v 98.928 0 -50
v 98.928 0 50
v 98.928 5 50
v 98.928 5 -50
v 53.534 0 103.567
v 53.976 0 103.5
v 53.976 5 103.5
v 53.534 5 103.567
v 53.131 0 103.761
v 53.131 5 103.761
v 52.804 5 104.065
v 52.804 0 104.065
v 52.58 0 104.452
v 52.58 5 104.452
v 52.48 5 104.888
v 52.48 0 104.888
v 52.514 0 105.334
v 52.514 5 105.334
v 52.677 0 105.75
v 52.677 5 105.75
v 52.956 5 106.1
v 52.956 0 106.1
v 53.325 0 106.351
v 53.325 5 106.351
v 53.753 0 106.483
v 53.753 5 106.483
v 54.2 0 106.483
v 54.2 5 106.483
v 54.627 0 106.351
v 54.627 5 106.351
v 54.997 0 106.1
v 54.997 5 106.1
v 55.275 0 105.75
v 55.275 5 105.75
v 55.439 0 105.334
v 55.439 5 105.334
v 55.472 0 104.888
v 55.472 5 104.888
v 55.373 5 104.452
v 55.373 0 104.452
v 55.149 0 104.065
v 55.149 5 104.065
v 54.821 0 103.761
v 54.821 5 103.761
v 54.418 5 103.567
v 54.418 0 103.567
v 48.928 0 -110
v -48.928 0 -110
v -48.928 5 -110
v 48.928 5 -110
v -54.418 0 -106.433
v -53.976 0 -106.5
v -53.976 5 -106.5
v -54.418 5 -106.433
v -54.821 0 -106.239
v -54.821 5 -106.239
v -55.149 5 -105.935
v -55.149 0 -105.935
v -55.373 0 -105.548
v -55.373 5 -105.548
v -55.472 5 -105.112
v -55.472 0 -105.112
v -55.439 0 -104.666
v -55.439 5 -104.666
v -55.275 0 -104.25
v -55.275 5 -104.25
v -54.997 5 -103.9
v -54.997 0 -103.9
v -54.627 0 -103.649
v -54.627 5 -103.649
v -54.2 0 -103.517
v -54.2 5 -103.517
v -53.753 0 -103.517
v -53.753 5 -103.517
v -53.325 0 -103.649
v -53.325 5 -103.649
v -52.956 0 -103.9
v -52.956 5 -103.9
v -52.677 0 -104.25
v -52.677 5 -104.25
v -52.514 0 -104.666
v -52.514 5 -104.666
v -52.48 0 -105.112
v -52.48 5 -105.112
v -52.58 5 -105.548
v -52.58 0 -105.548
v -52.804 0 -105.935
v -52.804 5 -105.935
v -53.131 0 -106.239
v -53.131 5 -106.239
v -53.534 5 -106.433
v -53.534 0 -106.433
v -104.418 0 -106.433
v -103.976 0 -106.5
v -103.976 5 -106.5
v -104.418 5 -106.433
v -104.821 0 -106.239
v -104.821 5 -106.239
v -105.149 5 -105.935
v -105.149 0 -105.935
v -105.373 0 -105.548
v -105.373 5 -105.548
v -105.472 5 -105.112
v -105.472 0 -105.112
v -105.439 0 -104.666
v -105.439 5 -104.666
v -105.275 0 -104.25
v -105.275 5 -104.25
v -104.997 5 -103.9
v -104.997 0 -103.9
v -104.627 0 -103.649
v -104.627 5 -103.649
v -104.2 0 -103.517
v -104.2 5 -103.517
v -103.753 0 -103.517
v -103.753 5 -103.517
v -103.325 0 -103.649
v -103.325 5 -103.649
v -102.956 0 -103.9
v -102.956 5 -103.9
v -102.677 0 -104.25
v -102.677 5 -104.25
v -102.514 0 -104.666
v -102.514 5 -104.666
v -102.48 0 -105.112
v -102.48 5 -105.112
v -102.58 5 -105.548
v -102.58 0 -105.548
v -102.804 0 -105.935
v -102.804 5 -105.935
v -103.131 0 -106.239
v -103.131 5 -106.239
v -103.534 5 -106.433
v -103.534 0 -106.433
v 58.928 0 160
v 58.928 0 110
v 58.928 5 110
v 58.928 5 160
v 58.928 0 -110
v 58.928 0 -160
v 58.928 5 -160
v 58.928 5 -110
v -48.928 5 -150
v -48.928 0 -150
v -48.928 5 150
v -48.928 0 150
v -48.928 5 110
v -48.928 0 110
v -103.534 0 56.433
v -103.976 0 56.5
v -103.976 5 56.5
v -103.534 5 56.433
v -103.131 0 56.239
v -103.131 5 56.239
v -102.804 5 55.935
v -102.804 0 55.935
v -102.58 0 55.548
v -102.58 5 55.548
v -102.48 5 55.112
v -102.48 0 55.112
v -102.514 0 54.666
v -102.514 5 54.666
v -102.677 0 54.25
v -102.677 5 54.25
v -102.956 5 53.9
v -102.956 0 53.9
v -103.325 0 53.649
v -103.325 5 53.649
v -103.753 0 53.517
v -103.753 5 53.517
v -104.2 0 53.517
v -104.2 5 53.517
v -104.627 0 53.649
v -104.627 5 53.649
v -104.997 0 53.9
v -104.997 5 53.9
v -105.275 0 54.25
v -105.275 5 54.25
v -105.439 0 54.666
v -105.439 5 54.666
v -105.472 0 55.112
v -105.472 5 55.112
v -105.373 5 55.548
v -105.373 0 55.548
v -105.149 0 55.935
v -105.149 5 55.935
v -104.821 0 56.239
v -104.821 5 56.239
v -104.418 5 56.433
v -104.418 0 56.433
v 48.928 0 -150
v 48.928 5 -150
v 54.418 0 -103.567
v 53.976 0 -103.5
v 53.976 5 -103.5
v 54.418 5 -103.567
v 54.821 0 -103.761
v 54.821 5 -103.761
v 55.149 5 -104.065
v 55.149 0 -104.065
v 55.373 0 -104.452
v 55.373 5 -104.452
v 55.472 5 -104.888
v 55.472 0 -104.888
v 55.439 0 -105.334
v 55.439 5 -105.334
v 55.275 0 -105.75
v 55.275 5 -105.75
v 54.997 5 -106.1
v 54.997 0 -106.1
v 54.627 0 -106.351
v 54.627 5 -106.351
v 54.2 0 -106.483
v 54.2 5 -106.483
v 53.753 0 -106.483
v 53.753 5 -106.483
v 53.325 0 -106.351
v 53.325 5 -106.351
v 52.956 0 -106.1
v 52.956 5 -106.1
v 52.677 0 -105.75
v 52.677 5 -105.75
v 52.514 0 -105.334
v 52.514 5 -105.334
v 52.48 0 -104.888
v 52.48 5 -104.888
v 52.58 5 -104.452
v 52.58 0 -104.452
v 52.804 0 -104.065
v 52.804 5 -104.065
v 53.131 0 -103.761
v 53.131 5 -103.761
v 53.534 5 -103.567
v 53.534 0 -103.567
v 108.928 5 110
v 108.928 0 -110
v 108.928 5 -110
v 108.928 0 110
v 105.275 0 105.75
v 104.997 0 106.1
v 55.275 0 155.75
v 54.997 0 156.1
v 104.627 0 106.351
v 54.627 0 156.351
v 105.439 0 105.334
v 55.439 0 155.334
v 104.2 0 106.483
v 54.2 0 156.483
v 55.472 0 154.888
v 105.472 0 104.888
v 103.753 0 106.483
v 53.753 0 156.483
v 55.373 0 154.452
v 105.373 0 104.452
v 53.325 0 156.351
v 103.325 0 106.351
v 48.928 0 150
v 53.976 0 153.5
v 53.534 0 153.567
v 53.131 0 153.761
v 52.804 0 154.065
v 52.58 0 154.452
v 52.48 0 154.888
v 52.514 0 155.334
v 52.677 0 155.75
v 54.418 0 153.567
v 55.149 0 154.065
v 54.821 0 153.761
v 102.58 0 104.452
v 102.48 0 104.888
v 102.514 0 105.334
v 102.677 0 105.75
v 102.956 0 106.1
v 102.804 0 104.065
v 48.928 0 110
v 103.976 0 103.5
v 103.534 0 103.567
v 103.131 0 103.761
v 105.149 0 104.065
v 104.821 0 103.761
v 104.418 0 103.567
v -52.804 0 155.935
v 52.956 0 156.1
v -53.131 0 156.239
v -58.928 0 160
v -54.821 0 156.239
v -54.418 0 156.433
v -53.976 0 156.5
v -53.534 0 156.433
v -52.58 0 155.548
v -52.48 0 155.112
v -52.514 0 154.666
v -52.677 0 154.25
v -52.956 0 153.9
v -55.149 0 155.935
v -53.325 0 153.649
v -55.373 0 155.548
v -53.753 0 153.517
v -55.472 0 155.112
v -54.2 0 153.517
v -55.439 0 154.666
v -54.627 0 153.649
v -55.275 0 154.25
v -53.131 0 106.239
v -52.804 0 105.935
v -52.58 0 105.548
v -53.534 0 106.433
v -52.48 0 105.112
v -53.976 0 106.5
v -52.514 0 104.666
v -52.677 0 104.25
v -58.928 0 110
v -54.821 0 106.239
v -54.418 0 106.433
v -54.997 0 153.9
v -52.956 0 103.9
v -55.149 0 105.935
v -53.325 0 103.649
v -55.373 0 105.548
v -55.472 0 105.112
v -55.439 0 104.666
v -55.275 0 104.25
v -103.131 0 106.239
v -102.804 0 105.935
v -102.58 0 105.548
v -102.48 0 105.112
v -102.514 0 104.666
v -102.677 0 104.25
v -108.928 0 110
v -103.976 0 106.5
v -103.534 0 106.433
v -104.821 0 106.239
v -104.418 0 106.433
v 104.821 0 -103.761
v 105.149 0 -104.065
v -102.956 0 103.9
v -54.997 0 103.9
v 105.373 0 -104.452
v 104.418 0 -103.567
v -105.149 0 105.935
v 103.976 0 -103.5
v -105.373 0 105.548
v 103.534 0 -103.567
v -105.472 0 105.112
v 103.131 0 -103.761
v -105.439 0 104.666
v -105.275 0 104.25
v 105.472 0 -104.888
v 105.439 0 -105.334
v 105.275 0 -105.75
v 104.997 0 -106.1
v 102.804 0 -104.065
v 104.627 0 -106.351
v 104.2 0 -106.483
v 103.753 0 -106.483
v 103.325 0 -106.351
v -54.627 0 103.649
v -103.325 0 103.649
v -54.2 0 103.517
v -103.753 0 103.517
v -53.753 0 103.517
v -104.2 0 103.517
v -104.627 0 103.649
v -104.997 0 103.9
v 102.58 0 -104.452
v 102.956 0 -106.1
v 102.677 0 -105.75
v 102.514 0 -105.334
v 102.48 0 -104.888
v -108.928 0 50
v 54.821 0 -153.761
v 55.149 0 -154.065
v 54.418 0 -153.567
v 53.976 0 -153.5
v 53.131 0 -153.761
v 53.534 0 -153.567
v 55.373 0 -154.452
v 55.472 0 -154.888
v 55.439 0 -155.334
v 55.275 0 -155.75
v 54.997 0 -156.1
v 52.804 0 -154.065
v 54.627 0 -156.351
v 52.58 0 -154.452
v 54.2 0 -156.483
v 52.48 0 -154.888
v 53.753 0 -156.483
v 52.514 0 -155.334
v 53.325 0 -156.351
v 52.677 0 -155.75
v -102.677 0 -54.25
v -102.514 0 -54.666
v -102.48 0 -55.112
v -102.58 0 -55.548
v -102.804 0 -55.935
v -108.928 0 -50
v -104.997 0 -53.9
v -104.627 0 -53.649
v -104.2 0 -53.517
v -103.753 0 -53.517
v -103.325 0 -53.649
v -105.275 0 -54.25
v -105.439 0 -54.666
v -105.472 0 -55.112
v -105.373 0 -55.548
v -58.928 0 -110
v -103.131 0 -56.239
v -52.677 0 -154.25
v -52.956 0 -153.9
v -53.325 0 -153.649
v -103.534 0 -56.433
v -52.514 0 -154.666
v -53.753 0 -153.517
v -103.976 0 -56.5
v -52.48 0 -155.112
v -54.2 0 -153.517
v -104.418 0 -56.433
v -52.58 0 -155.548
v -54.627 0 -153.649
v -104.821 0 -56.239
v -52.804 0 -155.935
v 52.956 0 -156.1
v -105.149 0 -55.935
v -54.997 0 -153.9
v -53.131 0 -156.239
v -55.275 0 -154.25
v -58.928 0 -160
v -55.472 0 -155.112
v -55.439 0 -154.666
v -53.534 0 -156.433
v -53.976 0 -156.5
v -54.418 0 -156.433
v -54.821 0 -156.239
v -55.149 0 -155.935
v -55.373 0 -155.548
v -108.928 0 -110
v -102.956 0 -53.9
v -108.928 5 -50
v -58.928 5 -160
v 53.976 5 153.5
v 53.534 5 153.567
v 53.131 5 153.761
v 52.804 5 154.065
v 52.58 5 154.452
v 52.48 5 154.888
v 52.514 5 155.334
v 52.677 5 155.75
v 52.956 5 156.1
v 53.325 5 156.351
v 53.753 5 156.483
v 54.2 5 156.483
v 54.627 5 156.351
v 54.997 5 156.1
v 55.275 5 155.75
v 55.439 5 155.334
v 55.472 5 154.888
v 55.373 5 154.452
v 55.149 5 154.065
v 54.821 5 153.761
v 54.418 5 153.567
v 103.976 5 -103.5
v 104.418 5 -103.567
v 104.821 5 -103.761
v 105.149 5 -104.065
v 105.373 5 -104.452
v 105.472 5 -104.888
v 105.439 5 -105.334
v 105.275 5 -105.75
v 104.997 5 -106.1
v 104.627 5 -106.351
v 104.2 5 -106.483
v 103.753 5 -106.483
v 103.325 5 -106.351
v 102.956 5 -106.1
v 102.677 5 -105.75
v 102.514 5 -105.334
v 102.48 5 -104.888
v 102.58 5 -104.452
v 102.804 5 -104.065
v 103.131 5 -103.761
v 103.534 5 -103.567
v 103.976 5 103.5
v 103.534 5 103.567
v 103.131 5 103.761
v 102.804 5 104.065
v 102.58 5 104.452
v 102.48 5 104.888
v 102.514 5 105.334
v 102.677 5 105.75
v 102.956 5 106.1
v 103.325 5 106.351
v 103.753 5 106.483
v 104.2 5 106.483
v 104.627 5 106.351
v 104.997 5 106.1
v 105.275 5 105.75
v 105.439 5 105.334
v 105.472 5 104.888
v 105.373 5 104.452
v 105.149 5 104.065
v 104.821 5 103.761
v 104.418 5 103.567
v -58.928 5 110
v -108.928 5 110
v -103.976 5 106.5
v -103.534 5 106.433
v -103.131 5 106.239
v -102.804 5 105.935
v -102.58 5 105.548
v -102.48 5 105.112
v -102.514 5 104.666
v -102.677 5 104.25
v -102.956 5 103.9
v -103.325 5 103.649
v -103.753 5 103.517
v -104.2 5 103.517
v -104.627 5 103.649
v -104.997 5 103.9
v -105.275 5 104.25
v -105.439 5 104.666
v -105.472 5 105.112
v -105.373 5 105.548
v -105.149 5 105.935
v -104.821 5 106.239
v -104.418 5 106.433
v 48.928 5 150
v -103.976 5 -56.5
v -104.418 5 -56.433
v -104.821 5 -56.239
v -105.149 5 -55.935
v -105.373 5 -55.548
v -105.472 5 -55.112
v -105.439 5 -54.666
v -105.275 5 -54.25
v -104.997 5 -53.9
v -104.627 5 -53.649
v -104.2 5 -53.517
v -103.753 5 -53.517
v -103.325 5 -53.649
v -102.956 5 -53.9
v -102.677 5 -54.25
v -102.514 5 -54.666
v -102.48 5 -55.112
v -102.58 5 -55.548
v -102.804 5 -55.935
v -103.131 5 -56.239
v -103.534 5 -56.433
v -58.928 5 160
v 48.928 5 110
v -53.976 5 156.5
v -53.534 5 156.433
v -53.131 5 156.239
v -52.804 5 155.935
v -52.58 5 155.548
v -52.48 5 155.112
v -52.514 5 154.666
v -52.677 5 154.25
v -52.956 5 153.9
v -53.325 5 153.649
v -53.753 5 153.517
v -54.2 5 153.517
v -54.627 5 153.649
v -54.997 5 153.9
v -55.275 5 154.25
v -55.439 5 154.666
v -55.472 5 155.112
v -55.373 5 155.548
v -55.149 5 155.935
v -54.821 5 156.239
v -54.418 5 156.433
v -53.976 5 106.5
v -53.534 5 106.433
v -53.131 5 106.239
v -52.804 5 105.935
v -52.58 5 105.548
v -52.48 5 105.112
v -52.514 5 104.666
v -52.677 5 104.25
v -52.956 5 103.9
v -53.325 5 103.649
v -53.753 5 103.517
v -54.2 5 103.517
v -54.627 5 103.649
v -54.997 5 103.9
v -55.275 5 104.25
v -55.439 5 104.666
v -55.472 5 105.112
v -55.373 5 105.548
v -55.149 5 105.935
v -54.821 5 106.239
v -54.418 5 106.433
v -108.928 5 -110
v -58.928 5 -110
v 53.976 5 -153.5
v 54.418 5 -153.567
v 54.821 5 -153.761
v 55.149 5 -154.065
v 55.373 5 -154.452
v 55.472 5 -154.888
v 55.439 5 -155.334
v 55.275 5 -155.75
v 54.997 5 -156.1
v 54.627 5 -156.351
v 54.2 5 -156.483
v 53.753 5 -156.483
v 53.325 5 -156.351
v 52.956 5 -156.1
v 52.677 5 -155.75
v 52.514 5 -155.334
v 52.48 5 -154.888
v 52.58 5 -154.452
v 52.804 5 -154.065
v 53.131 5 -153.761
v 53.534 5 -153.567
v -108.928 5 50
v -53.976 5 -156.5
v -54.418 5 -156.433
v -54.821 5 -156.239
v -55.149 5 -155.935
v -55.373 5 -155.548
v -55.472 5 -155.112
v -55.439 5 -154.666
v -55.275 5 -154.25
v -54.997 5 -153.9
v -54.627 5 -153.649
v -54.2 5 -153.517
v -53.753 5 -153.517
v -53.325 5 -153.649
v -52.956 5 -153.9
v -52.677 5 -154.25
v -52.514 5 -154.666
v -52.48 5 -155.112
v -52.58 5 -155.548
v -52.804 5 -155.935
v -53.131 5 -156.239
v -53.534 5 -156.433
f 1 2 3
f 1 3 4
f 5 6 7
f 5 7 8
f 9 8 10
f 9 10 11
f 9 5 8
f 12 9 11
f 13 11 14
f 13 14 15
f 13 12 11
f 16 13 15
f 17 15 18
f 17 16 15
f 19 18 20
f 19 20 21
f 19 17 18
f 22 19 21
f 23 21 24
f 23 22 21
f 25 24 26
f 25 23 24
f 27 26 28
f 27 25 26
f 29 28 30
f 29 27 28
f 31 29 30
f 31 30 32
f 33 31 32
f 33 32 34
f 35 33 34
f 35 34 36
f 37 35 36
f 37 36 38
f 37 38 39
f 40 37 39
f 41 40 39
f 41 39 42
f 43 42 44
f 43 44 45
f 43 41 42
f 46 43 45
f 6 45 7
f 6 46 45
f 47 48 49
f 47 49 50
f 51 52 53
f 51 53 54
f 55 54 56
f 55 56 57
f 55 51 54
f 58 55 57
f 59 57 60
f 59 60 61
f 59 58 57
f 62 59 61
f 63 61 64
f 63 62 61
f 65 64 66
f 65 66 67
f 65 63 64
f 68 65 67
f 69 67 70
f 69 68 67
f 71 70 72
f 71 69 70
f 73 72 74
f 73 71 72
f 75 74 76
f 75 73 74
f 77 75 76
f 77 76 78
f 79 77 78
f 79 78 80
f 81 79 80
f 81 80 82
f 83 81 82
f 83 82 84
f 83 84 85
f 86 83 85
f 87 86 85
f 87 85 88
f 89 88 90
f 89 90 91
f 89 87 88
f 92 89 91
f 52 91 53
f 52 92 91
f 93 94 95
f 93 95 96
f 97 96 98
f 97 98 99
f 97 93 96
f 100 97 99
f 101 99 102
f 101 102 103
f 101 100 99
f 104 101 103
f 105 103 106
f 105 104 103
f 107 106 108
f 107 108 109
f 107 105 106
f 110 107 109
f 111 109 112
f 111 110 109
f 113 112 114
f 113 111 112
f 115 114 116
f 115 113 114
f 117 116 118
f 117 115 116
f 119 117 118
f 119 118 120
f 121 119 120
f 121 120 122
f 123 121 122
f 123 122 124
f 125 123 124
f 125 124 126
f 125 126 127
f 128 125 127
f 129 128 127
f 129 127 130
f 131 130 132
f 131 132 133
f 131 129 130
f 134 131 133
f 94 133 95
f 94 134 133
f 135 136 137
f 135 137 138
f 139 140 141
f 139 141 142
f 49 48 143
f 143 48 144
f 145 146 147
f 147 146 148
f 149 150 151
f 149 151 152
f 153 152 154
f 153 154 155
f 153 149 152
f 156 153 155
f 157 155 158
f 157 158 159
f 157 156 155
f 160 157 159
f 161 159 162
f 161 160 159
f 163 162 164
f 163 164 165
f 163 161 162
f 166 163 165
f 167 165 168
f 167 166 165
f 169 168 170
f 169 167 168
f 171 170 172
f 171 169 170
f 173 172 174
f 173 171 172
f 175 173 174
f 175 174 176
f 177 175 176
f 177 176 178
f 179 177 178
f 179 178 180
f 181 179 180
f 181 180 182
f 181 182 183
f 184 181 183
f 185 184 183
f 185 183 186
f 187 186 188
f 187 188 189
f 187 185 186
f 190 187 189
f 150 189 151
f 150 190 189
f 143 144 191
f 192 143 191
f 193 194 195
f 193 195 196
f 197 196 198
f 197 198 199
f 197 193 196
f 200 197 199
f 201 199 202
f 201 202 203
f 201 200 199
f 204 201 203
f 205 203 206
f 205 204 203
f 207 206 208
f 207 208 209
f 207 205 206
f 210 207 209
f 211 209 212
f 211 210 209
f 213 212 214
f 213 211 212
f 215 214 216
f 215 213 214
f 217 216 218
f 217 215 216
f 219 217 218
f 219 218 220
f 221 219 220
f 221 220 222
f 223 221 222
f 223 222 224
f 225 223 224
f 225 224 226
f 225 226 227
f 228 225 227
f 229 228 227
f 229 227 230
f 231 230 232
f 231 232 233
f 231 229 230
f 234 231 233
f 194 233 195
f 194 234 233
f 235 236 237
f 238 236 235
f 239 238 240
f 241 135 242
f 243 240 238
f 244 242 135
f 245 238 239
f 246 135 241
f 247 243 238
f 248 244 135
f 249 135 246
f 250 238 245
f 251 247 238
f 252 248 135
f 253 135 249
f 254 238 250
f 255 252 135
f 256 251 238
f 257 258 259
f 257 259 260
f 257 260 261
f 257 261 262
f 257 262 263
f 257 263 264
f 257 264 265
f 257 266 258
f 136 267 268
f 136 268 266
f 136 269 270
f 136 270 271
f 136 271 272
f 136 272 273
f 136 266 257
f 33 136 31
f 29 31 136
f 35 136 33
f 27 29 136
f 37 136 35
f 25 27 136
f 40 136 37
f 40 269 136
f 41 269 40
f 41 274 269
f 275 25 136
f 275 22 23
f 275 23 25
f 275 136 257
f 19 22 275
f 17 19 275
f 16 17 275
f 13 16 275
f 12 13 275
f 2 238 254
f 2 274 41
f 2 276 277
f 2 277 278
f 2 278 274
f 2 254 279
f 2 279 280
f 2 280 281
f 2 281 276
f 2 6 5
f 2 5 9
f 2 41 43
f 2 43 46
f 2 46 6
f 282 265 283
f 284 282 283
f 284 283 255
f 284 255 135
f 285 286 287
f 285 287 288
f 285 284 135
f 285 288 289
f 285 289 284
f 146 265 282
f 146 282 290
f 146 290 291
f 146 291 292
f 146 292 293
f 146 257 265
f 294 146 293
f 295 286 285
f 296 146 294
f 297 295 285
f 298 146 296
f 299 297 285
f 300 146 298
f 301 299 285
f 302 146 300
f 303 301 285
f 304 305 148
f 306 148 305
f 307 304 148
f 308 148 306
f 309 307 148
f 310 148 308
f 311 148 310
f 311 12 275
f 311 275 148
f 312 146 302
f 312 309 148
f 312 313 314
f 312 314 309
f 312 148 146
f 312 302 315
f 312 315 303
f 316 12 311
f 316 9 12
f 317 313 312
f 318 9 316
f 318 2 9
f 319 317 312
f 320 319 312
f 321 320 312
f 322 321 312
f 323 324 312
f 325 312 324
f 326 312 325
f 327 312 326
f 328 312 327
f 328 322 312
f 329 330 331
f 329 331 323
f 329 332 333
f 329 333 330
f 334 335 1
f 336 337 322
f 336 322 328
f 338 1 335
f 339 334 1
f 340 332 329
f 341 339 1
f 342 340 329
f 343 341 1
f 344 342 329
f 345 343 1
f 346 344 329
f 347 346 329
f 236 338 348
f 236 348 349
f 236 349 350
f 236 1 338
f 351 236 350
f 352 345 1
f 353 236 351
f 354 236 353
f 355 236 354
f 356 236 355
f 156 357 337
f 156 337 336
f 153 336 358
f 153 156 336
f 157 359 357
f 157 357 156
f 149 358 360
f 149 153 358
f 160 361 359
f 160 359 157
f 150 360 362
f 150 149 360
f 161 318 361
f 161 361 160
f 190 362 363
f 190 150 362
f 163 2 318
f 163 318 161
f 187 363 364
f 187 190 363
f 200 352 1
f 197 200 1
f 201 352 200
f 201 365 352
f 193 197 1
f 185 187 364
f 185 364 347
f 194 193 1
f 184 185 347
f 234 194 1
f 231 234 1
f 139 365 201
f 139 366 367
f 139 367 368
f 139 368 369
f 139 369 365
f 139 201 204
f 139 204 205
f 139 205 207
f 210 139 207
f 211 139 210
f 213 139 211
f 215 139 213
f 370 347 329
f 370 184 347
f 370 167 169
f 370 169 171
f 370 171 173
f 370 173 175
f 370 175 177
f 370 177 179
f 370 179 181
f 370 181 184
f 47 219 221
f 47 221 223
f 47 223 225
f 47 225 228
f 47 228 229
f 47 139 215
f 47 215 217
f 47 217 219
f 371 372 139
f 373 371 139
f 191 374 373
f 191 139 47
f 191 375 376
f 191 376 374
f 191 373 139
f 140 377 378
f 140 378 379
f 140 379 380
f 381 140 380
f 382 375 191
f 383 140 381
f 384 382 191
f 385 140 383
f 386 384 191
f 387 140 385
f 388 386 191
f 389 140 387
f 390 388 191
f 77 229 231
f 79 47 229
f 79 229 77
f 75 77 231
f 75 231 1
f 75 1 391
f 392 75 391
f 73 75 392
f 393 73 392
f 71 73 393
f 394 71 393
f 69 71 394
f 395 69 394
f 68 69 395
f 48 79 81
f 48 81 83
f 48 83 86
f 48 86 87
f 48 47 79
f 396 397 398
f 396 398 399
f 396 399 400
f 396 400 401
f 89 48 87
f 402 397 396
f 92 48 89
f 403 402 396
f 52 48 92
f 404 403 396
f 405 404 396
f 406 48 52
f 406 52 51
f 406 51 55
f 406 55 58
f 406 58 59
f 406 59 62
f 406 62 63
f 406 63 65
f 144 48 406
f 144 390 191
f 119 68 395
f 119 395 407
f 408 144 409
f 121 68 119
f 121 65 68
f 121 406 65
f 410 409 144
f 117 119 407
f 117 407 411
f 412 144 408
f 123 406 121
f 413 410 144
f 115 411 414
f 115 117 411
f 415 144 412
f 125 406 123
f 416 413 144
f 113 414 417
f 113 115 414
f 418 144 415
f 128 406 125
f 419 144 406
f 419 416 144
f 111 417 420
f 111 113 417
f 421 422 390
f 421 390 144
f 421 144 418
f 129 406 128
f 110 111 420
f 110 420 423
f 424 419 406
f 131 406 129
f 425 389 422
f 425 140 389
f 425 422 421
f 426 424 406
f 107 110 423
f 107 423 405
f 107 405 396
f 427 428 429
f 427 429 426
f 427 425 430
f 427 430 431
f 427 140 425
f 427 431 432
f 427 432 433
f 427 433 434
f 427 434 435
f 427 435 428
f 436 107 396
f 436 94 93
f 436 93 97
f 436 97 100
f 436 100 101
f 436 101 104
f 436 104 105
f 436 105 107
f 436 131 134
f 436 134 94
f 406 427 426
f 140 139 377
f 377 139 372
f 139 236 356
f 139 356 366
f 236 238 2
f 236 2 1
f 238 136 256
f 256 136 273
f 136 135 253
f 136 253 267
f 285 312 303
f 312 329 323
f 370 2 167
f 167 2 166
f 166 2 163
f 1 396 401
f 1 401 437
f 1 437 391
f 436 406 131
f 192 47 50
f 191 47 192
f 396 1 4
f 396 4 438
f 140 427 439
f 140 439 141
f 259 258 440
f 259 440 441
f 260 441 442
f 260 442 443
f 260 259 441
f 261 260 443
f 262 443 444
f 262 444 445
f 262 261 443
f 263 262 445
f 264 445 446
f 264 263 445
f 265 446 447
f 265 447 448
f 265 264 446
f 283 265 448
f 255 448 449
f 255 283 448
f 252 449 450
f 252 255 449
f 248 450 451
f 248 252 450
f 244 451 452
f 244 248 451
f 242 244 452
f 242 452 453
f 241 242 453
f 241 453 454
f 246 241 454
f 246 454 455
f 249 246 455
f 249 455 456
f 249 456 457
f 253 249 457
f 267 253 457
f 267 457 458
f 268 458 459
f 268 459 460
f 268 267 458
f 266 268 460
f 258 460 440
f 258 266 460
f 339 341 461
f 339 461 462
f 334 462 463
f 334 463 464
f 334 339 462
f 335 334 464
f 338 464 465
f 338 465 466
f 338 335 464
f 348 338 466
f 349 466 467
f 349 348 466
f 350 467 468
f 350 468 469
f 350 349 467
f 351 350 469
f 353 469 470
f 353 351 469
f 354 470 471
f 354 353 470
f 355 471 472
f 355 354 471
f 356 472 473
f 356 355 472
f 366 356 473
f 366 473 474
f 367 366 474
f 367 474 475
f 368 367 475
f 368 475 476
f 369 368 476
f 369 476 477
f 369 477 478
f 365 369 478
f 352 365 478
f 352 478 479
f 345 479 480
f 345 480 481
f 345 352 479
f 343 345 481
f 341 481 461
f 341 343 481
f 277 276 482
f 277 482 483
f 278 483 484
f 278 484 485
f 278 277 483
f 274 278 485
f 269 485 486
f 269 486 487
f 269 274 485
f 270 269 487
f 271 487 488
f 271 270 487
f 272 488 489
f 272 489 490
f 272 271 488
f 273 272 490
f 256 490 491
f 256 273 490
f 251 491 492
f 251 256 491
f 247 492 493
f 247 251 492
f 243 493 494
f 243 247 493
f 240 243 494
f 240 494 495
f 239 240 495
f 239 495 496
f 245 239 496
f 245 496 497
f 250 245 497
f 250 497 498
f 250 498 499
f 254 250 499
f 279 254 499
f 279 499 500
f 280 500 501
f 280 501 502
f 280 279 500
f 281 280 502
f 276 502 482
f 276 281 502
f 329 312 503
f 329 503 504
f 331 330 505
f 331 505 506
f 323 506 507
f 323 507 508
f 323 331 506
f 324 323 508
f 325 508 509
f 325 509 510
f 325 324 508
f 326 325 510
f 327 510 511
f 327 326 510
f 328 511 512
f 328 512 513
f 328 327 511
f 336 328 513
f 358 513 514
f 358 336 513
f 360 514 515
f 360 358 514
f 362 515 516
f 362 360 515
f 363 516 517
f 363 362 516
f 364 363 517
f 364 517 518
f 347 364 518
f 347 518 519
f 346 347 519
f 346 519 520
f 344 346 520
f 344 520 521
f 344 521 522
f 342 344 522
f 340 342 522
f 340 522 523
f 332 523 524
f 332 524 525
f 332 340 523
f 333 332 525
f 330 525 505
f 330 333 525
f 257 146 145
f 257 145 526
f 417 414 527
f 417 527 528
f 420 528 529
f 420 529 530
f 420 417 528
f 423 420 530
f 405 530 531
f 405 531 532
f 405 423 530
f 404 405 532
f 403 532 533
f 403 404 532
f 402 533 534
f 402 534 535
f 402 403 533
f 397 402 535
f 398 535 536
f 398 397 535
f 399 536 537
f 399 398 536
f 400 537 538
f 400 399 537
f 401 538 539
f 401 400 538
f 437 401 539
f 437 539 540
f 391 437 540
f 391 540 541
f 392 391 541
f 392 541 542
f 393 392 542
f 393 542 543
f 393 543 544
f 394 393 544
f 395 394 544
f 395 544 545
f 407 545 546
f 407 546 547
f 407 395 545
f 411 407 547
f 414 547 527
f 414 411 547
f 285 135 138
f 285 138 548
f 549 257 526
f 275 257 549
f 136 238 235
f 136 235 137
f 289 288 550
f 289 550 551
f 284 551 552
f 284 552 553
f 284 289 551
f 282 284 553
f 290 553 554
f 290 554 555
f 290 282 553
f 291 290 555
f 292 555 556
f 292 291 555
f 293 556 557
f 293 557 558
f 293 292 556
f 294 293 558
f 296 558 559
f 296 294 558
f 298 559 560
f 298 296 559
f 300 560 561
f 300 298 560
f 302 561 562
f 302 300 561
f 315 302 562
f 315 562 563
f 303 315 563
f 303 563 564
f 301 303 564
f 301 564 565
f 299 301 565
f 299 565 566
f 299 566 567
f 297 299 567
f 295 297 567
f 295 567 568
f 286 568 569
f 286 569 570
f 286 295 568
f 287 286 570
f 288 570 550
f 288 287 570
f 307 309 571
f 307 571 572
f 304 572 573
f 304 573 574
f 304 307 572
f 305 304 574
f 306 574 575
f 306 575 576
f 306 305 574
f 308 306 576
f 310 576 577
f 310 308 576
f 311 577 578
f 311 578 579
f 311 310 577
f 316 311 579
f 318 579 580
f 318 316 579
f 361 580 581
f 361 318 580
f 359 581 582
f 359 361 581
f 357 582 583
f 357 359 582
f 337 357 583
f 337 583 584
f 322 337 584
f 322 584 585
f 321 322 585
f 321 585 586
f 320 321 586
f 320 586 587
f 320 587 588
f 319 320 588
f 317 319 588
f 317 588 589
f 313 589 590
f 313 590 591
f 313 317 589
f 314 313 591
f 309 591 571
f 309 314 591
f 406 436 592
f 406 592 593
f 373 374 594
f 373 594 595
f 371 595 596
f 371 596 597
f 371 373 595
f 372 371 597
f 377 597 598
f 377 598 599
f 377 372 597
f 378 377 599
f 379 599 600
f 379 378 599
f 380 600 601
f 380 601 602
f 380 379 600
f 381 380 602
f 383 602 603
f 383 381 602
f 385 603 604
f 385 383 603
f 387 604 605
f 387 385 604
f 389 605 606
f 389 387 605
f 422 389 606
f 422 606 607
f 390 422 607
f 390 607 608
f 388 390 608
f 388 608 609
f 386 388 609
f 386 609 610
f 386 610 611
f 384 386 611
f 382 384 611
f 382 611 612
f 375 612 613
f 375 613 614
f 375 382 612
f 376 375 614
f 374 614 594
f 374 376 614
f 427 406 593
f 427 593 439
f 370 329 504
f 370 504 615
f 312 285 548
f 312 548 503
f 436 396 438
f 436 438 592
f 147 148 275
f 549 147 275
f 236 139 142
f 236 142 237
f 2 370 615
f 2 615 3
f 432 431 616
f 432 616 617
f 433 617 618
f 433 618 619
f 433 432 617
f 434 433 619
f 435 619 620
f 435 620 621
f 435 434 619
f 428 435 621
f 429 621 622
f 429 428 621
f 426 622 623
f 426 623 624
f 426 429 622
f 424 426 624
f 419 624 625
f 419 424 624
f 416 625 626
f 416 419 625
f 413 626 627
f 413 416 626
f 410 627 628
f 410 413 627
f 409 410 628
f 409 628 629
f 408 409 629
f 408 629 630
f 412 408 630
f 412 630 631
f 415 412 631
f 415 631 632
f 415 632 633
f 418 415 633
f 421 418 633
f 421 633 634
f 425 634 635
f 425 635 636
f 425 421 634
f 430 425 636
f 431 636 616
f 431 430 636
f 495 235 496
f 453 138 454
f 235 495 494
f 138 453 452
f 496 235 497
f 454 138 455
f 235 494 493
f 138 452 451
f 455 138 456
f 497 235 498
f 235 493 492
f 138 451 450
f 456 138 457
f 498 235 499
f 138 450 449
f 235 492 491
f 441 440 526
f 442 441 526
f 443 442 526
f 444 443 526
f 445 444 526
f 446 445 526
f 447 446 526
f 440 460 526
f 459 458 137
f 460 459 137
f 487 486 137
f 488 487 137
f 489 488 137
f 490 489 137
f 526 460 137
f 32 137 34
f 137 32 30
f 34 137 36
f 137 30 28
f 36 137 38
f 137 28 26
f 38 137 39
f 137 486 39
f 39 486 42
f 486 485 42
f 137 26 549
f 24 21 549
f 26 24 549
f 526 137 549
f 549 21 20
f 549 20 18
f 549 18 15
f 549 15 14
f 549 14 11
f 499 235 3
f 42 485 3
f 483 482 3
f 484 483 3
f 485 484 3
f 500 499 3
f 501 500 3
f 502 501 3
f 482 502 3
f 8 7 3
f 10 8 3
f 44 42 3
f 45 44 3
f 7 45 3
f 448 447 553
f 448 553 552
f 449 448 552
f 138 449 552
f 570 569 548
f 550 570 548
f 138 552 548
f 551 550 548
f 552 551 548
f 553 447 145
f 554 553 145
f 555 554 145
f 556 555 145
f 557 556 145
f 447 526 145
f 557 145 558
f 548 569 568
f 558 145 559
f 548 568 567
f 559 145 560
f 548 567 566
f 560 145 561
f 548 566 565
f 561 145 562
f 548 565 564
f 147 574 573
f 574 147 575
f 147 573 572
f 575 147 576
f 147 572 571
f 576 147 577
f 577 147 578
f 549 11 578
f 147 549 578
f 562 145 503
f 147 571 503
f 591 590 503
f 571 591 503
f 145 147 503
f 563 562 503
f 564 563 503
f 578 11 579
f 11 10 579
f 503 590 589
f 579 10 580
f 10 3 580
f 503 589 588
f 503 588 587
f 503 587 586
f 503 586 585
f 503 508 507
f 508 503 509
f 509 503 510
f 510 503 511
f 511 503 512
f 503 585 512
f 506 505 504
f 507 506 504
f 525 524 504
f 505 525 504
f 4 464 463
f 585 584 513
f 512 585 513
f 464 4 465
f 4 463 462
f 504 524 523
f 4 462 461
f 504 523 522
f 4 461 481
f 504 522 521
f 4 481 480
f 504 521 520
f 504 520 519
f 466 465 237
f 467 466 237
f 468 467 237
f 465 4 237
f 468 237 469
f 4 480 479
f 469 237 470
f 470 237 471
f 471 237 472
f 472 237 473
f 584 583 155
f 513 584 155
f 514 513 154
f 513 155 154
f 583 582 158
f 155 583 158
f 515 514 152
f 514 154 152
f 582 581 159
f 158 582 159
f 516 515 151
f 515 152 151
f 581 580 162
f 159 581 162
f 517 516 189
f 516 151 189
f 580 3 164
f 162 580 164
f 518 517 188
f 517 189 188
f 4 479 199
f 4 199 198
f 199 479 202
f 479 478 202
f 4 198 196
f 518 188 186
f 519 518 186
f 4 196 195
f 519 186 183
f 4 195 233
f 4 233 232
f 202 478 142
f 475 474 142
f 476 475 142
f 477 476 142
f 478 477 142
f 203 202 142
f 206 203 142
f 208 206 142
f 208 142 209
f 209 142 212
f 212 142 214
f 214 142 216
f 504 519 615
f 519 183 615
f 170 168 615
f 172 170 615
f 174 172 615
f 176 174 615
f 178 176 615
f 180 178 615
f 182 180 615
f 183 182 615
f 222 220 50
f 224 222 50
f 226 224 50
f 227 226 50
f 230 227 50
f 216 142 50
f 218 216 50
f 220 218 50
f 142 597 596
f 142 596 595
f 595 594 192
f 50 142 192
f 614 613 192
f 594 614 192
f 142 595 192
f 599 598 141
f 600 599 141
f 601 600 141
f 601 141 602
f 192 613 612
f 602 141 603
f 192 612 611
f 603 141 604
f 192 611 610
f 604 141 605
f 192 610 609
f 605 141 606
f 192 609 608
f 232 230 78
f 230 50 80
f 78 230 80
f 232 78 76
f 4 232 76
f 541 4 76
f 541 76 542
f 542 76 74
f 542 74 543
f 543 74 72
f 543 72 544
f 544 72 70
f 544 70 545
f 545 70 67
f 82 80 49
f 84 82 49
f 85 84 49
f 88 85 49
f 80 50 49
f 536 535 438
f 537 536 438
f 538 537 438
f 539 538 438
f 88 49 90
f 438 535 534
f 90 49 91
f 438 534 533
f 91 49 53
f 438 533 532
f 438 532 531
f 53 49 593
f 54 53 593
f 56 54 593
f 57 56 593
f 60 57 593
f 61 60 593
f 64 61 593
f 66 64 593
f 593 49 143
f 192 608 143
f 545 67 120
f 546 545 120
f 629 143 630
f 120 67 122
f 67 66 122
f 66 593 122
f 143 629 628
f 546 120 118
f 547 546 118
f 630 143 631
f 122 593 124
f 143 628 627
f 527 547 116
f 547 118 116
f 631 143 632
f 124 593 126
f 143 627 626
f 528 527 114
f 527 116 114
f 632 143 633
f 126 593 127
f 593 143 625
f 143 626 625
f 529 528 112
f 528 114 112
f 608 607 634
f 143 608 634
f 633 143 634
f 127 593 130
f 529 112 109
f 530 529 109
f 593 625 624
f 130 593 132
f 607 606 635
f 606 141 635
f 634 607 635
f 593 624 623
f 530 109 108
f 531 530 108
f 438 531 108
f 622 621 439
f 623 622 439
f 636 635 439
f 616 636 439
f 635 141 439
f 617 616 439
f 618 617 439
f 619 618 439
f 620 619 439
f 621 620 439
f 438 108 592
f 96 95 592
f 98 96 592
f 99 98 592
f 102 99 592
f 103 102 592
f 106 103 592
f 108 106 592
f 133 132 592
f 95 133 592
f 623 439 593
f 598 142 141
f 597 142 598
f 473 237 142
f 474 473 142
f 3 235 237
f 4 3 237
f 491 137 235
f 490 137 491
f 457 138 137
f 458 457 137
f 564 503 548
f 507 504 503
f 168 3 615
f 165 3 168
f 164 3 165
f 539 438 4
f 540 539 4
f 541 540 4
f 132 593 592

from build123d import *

# Parameters (mm, degrees)
ESQUISSE1_R        = 1.5
ESQUISSE1_W        = 97.855109658
ESQUISSE1_H        = 40
BOSS_EXTRU_1_DEPTH = 5


with BuildPart() as part:
    # Esquisse1 → Boss.-Extru.1 (new body)
    with BuildSketch(Plane(origin=(0, 0, 0), x_dir=(1, 0, 0), z_dir=(0, 1, 0))):
        Polygon((-58.927554829, 110), (-58.927554829, 160), (58.927554829, 160), (58.927554829, 110), (108.927554829, 110), (108.927554829, -110), (58.927554829, -110), (58.927554829, -160), (-58.927554829, -160), (-58.927554829, -110), (-108.927554829, -110), (-108.927554829, -50), (98.927554829, -50), (98.927554829, 50), (-108.927554829, 50), (-108.927554829, 110), align=None)
        with Locations(Location((-103.976302336, -105, 0), (0, 0, 270))):
            Circle(ESQUISSE1_R, mode=Mode.SUBTRACT)
        with Locations(Location((-103.976302336, -55, 0), (0, 0, 270))):
            Circle(ESQUISSE1_R, mode=Mode.SUBTRACT)
        with Locations(Location((-53.976302336, -105, 0), (0, 0, 270))):
            Circle(ESQUISSE1_R, mode=Mode.SUBTRACT)
        with Locations(Location((-53.976302336, -155, 0), (0, 0, 270))):
            Circle(ESQUISSE1_R, mode=Mode.SUBTRACT)
        with Locations(Location((-53.976302336, 155, 0), (0, 0, 90))):
            Circle(ESQUISSE1_R, mode=Mode.SUBTRACT)
        with Locations(Location((-53.976302336, 105, 0), (0, 0, 90))):
            Circle(ESQUISSE1_R, mode=Mode.SUBTRACT)
        with Locations(Location((-103.976302336, 105, 0), (0, 0, 90))):
            Circle(ESQUISSE1_R, mode=Mode.SUBTRACT)
        with Locations(Location((-103.976302336, 55, 0), (0, 0, 90))):
            Circle(ESQUISSE1_R, mode=Mode.SUBTRACT)
        with Locations(Location((53.976302336, -155, 0), (0, 0, 90))):
            Circle(ESQUISSE1_R, mode=Mode.SUBTRACT)
        with Locations(Location((53.976302336, -105, 0), (0, 0, 90))):
            Circle(ESQUISSE1_R, mode=Mode.SUBTRACT)
        with Locations(Location((103.976302336, -105, 0), (0, 0, 90))):
            Circle(ESQUISSE1_R, mode=Mode.SUBTRACT)
        with Locations(Location((103.976302336, 105, 0), (0, 0, 270))):
            Circle(ESQUISSE1_R, mode=Mode.SUBTRACT)
        with Locations(Location((53.976302336, 105, 0), (0, 0, 270))):
            Circle(ESQUISSE1_R, mode=Mode.SUBTRACT)
        with Locations(Location((53.976302336, 155, 0), (0, 0, 270))):
            Circle(ESQUISSE1_R, mode=Mode.SUBTRACT)
        with Locations((0, -130)):
            Rectangle(ESQUISSE1_W, ESQUISSE1_H, mode=Mode.SUBTRACT)
        with Locations((0, 130)):
            Rectangle(ESQUISSE1_W, ESQUISSE1_H, mode=Mode.SUBTRACT)
    extrude(amount=BOSS_EXTRU_1_DEPTH)


solid = part.part
